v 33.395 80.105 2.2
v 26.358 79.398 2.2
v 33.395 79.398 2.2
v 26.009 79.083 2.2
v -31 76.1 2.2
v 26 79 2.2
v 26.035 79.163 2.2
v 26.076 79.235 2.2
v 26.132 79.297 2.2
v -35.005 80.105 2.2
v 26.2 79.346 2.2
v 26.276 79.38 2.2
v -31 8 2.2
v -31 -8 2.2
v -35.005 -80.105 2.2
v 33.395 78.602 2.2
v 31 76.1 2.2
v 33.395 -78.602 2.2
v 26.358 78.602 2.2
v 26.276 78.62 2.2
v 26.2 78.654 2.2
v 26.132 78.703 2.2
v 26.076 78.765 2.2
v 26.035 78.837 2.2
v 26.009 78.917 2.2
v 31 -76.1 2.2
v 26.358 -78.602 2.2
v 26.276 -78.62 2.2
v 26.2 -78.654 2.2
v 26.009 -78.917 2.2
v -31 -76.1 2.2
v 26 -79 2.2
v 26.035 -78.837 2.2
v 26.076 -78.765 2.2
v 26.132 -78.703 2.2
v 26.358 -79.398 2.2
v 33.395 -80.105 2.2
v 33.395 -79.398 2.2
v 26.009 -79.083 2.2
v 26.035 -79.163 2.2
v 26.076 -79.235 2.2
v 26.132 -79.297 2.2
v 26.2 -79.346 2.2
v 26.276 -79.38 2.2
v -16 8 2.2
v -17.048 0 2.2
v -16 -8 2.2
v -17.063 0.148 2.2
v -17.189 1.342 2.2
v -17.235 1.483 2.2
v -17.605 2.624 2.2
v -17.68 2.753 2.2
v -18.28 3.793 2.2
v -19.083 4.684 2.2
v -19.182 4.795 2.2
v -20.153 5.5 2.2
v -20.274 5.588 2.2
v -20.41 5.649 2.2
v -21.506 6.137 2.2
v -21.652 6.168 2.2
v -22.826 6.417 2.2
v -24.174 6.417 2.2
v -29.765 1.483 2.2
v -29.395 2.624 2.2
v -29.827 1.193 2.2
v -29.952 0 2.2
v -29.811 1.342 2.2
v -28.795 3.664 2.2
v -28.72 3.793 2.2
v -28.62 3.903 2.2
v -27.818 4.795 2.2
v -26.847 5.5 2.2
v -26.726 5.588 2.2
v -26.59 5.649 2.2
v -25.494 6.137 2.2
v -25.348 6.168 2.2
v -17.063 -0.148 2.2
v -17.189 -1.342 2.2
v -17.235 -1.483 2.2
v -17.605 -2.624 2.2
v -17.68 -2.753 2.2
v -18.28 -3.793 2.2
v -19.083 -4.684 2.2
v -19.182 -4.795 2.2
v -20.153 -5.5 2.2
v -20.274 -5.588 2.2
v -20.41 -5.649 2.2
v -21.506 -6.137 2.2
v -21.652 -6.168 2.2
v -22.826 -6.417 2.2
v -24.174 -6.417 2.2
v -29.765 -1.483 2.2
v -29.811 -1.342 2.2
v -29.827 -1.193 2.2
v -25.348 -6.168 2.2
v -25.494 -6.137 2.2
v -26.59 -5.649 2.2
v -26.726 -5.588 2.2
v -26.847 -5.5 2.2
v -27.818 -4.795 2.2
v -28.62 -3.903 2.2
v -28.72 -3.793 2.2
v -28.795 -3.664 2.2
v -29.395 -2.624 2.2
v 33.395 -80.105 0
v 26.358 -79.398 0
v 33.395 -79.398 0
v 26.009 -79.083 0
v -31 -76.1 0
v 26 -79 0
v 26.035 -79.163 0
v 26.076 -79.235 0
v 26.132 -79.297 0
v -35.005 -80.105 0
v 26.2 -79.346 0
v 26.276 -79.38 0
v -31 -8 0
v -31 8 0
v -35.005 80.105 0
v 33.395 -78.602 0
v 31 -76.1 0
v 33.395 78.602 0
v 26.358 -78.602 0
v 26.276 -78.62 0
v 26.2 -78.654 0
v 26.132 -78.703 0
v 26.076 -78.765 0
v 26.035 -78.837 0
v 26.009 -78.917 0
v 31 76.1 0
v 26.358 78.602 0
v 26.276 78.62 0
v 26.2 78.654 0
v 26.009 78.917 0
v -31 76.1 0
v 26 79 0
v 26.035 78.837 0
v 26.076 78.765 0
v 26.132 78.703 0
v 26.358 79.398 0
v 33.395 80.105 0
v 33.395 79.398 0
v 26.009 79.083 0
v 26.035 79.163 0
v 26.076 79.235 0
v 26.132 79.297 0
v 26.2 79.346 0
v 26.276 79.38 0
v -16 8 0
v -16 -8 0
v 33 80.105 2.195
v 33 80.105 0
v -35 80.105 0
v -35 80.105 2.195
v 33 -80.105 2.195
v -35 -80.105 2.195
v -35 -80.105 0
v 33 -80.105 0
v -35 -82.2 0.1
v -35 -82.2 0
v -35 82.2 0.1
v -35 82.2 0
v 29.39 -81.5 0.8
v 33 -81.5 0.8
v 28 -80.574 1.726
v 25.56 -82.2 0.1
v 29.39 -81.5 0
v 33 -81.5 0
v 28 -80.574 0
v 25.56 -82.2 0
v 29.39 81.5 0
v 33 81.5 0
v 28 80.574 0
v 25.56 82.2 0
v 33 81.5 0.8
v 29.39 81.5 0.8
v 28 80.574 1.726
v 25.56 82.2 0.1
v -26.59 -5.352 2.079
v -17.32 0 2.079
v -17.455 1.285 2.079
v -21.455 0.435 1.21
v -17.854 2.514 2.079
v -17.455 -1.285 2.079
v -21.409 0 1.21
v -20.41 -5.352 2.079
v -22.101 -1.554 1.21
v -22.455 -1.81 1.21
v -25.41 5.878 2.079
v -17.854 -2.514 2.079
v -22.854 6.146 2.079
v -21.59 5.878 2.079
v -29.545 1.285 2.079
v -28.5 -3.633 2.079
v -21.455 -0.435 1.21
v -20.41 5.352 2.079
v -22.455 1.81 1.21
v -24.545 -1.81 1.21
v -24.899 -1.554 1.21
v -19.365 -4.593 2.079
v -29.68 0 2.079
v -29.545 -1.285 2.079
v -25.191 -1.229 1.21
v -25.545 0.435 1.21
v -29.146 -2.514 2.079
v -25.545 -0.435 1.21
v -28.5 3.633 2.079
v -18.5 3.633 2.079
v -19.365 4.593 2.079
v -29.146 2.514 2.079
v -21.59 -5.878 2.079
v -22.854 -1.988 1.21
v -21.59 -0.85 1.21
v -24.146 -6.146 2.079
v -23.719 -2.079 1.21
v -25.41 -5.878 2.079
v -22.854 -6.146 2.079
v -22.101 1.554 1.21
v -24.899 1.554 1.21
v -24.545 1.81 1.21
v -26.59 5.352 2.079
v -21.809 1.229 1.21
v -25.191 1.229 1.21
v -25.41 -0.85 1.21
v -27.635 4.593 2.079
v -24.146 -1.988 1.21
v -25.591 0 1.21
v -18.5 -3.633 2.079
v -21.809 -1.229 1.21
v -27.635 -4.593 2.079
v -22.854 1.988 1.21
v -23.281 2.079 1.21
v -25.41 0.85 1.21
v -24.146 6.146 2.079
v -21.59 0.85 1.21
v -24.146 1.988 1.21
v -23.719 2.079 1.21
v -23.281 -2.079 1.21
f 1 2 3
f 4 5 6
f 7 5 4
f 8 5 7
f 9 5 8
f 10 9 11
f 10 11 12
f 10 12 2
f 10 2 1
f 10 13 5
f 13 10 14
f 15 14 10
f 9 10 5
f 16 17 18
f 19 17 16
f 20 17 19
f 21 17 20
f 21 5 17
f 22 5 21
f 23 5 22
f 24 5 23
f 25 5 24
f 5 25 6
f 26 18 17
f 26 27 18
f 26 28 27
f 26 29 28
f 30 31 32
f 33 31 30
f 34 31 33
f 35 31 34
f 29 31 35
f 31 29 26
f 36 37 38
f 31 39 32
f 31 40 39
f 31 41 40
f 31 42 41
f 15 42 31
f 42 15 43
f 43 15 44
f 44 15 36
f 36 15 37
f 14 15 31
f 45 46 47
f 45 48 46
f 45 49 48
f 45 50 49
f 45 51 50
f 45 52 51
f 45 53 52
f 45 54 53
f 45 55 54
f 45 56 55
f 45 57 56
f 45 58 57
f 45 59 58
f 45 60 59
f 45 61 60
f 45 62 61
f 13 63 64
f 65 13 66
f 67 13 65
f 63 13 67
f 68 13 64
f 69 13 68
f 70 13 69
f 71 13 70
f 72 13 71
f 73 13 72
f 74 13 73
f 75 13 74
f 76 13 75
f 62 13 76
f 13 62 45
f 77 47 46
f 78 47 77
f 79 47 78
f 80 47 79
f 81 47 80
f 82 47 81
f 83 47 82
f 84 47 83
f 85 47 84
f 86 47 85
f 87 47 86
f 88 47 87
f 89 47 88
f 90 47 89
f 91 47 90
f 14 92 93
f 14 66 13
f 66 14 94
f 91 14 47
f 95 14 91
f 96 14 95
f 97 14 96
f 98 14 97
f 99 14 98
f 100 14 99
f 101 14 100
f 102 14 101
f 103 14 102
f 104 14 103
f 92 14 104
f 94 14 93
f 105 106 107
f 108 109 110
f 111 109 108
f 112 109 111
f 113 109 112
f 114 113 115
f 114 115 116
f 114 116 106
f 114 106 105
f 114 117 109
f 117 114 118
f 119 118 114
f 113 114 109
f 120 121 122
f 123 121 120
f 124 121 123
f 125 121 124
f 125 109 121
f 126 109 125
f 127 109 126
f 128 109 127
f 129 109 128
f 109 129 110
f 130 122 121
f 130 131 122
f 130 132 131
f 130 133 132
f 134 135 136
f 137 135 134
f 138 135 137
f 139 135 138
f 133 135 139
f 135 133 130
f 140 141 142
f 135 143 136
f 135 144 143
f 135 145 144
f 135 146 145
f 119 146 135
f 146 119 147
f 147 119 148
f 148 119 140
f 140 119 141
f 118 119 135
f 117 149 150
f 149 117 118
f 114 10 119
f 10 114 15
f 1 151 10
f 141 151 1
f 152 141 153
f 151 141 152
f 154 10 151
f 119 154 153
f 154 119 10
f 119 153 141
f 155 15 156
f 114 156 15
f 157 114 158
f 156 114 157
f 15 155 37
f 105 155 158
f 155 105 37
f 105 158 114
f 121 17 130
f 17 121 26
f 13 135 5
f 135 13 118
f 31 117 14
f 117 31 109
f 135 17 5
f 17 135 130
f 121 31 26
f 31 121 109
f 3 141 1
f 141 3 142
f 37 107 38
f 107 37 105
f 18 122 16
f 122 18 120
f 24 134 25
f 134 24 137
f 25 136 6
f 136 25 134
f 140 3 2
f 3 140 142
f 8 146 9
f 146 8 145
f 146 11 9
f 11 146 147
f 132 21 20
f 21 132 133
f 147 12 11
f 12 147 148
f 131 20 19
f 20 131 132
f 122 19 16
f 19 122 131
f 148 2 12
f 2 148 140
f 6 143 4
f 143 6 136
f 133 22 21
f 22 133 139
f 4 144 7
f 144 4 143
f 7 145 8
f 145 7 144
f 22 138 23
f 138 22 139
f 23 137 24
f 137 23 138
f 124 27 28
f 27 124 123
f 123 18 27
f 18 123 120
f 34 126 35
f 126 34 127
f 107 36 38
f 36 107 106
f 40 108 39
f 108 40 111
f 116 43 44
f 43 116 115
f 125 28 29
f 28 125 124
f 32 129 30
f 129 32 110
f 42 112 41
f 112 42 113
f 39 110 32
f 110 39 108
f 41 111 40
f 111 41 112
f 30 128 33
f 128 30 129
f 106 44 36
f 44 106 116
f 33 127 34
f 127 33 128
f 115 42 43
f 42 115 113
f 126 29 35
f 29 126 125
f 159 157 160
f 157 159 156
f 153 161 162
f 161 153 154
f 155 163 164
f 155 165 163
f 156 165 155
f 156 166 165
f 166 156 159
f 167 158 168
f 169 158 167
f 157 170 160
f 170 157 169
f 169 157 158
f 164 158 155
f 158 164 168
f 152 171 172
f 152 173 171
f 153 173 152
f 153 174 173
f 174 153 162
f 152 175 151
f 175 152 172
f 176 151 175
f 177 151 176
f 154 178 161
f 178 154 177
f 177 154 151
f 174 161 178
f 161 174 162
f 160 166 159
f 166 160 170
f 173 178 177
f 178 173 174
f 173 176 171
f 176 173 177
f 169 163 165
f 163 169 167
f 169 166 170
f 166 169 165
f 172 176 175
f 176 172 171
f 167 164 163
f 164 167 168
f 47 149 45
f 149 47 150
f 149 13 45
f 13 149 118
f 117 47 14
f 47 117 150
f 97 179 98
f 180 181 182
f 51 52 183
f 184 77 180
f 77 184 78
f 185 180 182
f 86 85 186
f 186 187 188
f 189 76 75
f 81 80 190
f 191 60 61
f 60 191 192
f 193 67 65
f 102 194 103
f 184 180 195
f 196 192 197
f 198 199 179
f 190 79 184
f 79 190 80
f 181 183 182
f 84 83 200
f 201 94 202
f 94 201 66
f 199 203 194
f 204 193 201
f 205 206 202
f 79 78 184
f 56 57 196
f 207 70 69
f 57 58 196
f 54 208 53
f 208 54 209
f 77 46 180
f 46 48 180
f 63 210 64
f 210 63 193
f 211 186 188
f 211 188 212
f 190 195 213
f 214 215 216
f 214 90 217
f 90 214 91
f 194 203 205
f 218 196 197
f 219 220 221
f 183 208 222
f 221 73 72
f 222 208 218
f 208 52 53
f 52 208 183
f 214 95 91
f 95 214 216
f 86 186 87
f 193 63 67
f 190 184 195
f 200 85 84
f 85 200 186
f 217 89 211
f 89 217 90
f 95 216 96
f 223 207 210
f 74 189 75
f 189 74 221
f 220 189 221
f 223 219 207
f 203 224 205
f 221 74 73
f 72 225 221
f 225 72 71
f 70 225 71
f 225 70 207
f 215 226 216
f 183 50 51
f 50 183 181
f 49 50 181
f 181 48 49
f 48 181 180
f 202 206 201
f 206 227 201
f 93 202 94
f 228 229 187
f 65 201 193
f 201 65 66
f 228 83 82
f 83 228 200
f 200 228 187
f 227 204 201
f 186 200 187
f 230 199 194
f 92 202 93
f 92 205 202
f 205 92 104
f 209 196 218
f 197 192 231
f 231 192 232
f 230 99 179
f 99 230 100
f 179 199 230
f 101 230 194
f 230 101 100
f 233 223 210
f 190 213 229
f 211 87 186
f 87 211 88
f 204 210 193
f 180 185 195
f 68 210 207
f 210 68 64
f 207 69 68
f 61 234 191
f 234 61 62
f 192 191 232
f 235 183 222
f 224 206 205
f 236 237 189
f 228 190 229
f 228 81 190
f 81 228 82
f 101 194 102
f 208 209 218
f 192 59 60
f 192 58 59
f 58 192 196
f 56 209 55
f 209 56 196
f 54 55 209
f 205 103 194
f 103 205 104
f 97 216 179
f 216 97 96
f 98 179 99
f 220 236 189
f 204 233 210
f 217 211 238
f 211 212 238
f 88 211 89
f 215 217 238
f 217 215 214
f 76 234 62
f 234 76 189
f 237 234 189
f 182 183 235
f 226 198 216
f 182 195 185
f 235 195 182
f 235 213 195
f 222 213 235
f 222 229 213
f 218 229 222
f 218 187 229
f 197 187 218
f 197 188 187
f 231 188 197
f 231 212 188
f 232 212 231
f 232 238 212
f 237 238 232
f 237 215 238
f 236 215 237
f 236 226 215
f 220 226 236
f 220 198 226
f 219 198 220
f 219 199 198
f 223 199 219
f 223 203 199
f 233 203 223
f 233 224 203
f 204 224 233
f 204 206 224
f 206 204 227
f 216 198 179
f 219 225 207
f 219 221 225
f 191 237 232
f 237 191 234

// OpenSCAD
$fn=30;

/* [Global] */

// Render
Objects = "Lid"; //  [Both, Box, Lid]
// Type of lid pattern
gPattern = "Diamond"; //  [Hex, Diamond, Solid, Fancy]
// Tolerance
gTol = 0.3;
// Wall Thickness
gWT = 1.6;

//  padded mini 8 in x, and 2 in y  to give it a lip
CastleX = 55;
CastleY1 = 26;
CastleY2 = 47;

MiniX = 66;
MiniY =60;

SepBuffer = 13.2;

// Box Height
LidH = 2.2;
RailThick = 1.4;
RailWidth = LidH + RailThick;

function SumList(list, start, end) = (start == end) ? 0 : list[start] + SumList(list, start+1, end);
// Box Length
TotalX = 70;
// Box Width 10 mm pad between skill and level for finger slot
TotalY = 168;
TotalZ = 43;


echo("Size: ",TotalX,TotalY, TotalZ);
   
// Height not counting the lid
AdjBoxHeight = TotalZ - LidH;

 module regular_polygon(order, r=1){
 	angles=[ for (i = [0:order-1]) i*(360/order) ];
 	coords=[ for (th=angles) [r*cos(th), r*sin(th)] ];
 	polygon(coords);
 }

 module trap_pyramid(base, top, h){
    polygon(points=[[-h/2,-base/2],
                    [h/2,-top/2],
                    [h/2,top/2],
                    [-h/2,base/2]]);
 }

module diamond_lattice(ipX, ipY, DSize, WSize)  {

    lOffset = DSize + WSize;

	difference()  {
		square([ipX, ipY]);
		for (x=[0:lOffset:ipX]) {
            for (y=[0:lOffset:ipY]){
  			   translate([x, y])  regular_polygon(4, r=DSize/2);
			   translate([x+lOffset/2, y+lOffset/2]) regular_polygon(4, r=DSize/2);
		    }
        }        
	}
}

module circle_lattice(ipX, ipY, Spacing=10, Walls=1.2)  {


   intersection() {
      square([ipX,ipY]); 
      union() {
	    for (x=[-Spacing:Spacing:ipX+Spacing]) {
           for (y=[-Spacing:Spacing:ipY+Spacing]){
	          difference()  {
			     translate([x+Spacing/2, y+Spacing/2]) circle(r=Spacing*0.75);
			     translate([x+Spacing/2, y+Spacing/2]) circle(r=(Spacing*0.75)-Walls);
		      }
           }   // end for y        
	    }  // end for x
      } // End union
   }
}

module football() {
    scale([0.7,0.7])
    intersection(){
        translate([-4,0]) circle(6);
        translate([4,0]) circle(6);
    }
}

module RCube(x,y,z,ipR=4) {
    translate([-x/2,-y/2,0]) hull(){
      translate([ipR,ipR,ipR]) sphere(ipR);
      translate([x-ipR,ipR,ipR]) sphere(ipR);
      translate([ipR,y-ipR,ipR]) sphere(ipR);
      translate([x-ipR,y-ipR,ipR]) sphere(ipR);
      translate([ipR,ipR,z-ipR]) sphere(ipR);
      translate([x-ipR,ipR,z-ipR]) sphere(ipR);
      translate([ipR,y-ipR,z-ipR]) sphere(ipR);
      translate([x-ipR,y-ipR,z-ipR]) sphere(ipR);
      }  
} 

module lid(ipPattern = "Hex", ipTol = 0.3){
  lAdjX = TotalX;
  lAdjY = TotalY-RailWidth*2-ipTol*2;  
  lAdjZ = LidH;
  CutX = lAdjX - 8;
  CutY = lAdjY - 8;
  lFingerX = 15;
  lFingerY = 16;  

  // main square with center removed for a pattern. 0.01 addition is a kludge to avoid a 2d surface remainging when substracting the lid from the box.
         difference() {
      translate([0,0,lAdjZ/2]) cube([lAdjX+0.01, lAdjY+0.01 , lAdjZ], center=true);

      translate([0,0,lAdjZ/2]) cube([CutX, CutY, lAdjZ], center = true);
      translate([TotalX/2-gWT/2,0,LidH/2])cube([gWT+0.01,TotalY-RailWidth,LidH],center=true);

     // make a slot for the latch can flex         
     translate([TotalX/2,TotalY/2-RailWidth-1.4,-1]) RCube(18,0.8,4,0.4);
     translate([TotalX/2,-TotalY/2+RailWidth+1.4,-1]) RCube(18,0.8,4,0.4);
  }
  
  // The Side triangles
  difference() {
    intersection () {
      union () {
          translate([-lAdjX/2,-lAdjY/2-LidH,LidH]) rotate([0,90,0]) linear_extrude(TotalX-2) polygon([[LidH,0],[LidH,LidH],[0,LidH]], paths=[[0,1,2]]);
          translate([-lAdjX/2,lAdjY/2,LidH]) rotate([0,90,0]) linear_extrude(TotalX-2) polygon([[0,0],[LidH,0],[LidH,LidH]], paths=[[0,1,2]]);
      }
      
      // check if this is real lid (ipTol>0) or negative lid (iptol = 0)
      // if real lid remove center for pattern and remove latches
      if (ipTol>0) 
         {cube([lAdjX, lAdjY + 2*LidH-0.2, lAdjZ*2], center=true);}
    }
       
    if (ipTol>0)
    {
        // cut out slots for the latch 
        translate([TotalX/2-7,lAdjY/2+RailWidth/2+ipTol,LidH/2]) scale([1.5,1,1]) rotate([0,0,45]) cube ([2+ipTol,2+ipTol,LidH+1],center=true);
          
        translate([TotalX/2-7,-lAdjY/2-RailWidth/2-ipTol,LidH/2]) scale([1.5,1,1]) rotate([0,0,45]) cube ([2+ipTol,2+ipTol,LidH+1],center=true);
  
        // trip the rail to ease going past the nub
        translate([TotalX/2,TotalY/2-LidH/2-ipTol,0]) cube([12,LidH,LidH*2],center=true); 
        translate([TotalX/2,-TotalY/2+LidH/2+ipTol,0]) cube([12,LidH,LidH*2],center=true); 
    }
    
  }
 
  // Finger slot
  difference () {
      translate([-CutX/2,-lFingerY/2,0]) cube([lFingerX, lFingerY, lAdjZ]); 
      translate([-CutX/2+lFingerX/2,0,20+LidH/2])sphere(20);     
  }

  // Diamond top
  if (ipPattern == "Diamond") 
    {
      difference (){ 
        translate([-CutX/2,-CutY/2,0]) linear_extrude(height = lAdjZ) diamond_lattice(CutX,CutY,7,2);
        translate([-CutX/2,-lFingerY/2,0]) cube([lFingerX, lFingerY, lAdjZ]); 
                }
    }
}


module box () {
//  Main Box
    
  difference() {   
     union(){
        // main box 
        translate ([0,0,AdjBoxHeight/2]) cube([TotalX,TotalY,AdjBoxHeight], center = true);
        // add backstop
        translate([TotalX/2-1/2,0,TotalZ-LidH/2])cube([1,TotalY-RailWidth,LidH],center=true);
     }

    // limit backdrop
//     translate([TotalX/2,0,AdjBoxHeight+5])cube([4,TotalY-16,10],center=true);

    // Scope out castle areas
    CastleSpacing = CastleY2/2 + SepBuffer;
     
    translate([TotalX/2-CastleX/2-gWT,TotalY/2+7-CastleSpacing,gWT])  linear_extrude(TotalZ) rotate([0,0,180]) trap_pyramid(CastleY2, CastleY1, CastleX);
         
    translate([-TotalX/2+CastleX/2+gWT,TotalY/2+7-CastleSpacing*2,gWT])  linear_extrude(TotalZ) trap_pyramid(CastleY2, CastleY1, CastleX);   
    
    translate([TotalX/2-CastleX/2-gWT,TotalY/2+7-CastleSpacing*3,gWT]) linear_extrude(100) rotate([0,0,180]) trap_pyramid(CastleY2, CastleY1, CastleX); 
     
    translate([-TotalX/2+CastleX/2+gWT,TotalY/2+7-CastleSpacing*4,gWT]) linear_extrude(100)  trap_pyramid(CastleY2, CastleY1, CastleX);
     
 //   translate([+TotalX/2-MiniX/2-gWT,-TotalY/2+MiniY/2+RailWidth,gWT]) RCube(MiniX,MiniY,TotalZ);
     

  }




  // top rails
  difference() {
      union() {
          translate([0,-TotalY/2+RailWidth/2,AdjBoxHeight+LidH/2]) cube([TotalX,RailWidth,LidH],center = true);  
          translate([0,TotalY/2-RailWidth/2,AdjBoxHeight+LidH/2]) cube([TotalX,RailWidth,LidH],center = true);
           }
       
      // Trim each rail top to a 45 degree angle     
      translate([0,-TotalY/2,AdjBoxHeight+RailWidth]) rotate([45,0,0]) cube([TotalX,RailWidth+0.7,RailWidth+0.7], center=true); 
      translate([0,TotalY/2,AdjBoxHeight+RailWidth])  rotate([45,0,0]) cube([TotalX,RailWidth+0.7,RailWidth+0.7], center=true);  

      // Substract the lid from the rails
      translate([0,0,AdjBoxHeight]) lid(ipPattern = "Solid",ipTol =0);      
  }  
  

  
  // create the latches 
    translate([TotalX/2-7,TotalY/2-0.1-RailWidth/2,TotalZ-LidH/2]) scale([1.5,1,1]) difference(){
      rotate([0,0,45]) cube ([2,2,LidH+1],center=true);
      translate([0,2,0]) cube ([4,4,LidH+2],center=true);
      translate([0,-2,0])cube([2,2,LidH+2], center=true);
      }  
    translate([TotalX/2-7,-TotalY/2+0.1+RailWidth/2,TotalZ-LidH/2]) scale([1.5,1,1]) difference(){
      rotate([0,0,45]) cube ([2,2,LidH+1],center=true);
      translate([0,-2,0]) cube ([4,4,LidH+2],center=true);
      translate([0,2,0])cube([2,2,LidH+2], center=true);
      }

  
} 

// Production Box
if ((Objects == "Both") || (Objects == "Box")){
 intersection() {
    box();
     RCube(TotalX,TotalY,TotalZ,1);
  }
}

// Production Lid
if (Objects == "Both"){
  translate([-TotalX - 10,0,0]) lid(ipPattern = gPattern, ipTol = gTol);
}

// Production Lid
if (Objects == "Lid"){
  lid(ipPattern = gPattern, ipTol = gTol);
}
